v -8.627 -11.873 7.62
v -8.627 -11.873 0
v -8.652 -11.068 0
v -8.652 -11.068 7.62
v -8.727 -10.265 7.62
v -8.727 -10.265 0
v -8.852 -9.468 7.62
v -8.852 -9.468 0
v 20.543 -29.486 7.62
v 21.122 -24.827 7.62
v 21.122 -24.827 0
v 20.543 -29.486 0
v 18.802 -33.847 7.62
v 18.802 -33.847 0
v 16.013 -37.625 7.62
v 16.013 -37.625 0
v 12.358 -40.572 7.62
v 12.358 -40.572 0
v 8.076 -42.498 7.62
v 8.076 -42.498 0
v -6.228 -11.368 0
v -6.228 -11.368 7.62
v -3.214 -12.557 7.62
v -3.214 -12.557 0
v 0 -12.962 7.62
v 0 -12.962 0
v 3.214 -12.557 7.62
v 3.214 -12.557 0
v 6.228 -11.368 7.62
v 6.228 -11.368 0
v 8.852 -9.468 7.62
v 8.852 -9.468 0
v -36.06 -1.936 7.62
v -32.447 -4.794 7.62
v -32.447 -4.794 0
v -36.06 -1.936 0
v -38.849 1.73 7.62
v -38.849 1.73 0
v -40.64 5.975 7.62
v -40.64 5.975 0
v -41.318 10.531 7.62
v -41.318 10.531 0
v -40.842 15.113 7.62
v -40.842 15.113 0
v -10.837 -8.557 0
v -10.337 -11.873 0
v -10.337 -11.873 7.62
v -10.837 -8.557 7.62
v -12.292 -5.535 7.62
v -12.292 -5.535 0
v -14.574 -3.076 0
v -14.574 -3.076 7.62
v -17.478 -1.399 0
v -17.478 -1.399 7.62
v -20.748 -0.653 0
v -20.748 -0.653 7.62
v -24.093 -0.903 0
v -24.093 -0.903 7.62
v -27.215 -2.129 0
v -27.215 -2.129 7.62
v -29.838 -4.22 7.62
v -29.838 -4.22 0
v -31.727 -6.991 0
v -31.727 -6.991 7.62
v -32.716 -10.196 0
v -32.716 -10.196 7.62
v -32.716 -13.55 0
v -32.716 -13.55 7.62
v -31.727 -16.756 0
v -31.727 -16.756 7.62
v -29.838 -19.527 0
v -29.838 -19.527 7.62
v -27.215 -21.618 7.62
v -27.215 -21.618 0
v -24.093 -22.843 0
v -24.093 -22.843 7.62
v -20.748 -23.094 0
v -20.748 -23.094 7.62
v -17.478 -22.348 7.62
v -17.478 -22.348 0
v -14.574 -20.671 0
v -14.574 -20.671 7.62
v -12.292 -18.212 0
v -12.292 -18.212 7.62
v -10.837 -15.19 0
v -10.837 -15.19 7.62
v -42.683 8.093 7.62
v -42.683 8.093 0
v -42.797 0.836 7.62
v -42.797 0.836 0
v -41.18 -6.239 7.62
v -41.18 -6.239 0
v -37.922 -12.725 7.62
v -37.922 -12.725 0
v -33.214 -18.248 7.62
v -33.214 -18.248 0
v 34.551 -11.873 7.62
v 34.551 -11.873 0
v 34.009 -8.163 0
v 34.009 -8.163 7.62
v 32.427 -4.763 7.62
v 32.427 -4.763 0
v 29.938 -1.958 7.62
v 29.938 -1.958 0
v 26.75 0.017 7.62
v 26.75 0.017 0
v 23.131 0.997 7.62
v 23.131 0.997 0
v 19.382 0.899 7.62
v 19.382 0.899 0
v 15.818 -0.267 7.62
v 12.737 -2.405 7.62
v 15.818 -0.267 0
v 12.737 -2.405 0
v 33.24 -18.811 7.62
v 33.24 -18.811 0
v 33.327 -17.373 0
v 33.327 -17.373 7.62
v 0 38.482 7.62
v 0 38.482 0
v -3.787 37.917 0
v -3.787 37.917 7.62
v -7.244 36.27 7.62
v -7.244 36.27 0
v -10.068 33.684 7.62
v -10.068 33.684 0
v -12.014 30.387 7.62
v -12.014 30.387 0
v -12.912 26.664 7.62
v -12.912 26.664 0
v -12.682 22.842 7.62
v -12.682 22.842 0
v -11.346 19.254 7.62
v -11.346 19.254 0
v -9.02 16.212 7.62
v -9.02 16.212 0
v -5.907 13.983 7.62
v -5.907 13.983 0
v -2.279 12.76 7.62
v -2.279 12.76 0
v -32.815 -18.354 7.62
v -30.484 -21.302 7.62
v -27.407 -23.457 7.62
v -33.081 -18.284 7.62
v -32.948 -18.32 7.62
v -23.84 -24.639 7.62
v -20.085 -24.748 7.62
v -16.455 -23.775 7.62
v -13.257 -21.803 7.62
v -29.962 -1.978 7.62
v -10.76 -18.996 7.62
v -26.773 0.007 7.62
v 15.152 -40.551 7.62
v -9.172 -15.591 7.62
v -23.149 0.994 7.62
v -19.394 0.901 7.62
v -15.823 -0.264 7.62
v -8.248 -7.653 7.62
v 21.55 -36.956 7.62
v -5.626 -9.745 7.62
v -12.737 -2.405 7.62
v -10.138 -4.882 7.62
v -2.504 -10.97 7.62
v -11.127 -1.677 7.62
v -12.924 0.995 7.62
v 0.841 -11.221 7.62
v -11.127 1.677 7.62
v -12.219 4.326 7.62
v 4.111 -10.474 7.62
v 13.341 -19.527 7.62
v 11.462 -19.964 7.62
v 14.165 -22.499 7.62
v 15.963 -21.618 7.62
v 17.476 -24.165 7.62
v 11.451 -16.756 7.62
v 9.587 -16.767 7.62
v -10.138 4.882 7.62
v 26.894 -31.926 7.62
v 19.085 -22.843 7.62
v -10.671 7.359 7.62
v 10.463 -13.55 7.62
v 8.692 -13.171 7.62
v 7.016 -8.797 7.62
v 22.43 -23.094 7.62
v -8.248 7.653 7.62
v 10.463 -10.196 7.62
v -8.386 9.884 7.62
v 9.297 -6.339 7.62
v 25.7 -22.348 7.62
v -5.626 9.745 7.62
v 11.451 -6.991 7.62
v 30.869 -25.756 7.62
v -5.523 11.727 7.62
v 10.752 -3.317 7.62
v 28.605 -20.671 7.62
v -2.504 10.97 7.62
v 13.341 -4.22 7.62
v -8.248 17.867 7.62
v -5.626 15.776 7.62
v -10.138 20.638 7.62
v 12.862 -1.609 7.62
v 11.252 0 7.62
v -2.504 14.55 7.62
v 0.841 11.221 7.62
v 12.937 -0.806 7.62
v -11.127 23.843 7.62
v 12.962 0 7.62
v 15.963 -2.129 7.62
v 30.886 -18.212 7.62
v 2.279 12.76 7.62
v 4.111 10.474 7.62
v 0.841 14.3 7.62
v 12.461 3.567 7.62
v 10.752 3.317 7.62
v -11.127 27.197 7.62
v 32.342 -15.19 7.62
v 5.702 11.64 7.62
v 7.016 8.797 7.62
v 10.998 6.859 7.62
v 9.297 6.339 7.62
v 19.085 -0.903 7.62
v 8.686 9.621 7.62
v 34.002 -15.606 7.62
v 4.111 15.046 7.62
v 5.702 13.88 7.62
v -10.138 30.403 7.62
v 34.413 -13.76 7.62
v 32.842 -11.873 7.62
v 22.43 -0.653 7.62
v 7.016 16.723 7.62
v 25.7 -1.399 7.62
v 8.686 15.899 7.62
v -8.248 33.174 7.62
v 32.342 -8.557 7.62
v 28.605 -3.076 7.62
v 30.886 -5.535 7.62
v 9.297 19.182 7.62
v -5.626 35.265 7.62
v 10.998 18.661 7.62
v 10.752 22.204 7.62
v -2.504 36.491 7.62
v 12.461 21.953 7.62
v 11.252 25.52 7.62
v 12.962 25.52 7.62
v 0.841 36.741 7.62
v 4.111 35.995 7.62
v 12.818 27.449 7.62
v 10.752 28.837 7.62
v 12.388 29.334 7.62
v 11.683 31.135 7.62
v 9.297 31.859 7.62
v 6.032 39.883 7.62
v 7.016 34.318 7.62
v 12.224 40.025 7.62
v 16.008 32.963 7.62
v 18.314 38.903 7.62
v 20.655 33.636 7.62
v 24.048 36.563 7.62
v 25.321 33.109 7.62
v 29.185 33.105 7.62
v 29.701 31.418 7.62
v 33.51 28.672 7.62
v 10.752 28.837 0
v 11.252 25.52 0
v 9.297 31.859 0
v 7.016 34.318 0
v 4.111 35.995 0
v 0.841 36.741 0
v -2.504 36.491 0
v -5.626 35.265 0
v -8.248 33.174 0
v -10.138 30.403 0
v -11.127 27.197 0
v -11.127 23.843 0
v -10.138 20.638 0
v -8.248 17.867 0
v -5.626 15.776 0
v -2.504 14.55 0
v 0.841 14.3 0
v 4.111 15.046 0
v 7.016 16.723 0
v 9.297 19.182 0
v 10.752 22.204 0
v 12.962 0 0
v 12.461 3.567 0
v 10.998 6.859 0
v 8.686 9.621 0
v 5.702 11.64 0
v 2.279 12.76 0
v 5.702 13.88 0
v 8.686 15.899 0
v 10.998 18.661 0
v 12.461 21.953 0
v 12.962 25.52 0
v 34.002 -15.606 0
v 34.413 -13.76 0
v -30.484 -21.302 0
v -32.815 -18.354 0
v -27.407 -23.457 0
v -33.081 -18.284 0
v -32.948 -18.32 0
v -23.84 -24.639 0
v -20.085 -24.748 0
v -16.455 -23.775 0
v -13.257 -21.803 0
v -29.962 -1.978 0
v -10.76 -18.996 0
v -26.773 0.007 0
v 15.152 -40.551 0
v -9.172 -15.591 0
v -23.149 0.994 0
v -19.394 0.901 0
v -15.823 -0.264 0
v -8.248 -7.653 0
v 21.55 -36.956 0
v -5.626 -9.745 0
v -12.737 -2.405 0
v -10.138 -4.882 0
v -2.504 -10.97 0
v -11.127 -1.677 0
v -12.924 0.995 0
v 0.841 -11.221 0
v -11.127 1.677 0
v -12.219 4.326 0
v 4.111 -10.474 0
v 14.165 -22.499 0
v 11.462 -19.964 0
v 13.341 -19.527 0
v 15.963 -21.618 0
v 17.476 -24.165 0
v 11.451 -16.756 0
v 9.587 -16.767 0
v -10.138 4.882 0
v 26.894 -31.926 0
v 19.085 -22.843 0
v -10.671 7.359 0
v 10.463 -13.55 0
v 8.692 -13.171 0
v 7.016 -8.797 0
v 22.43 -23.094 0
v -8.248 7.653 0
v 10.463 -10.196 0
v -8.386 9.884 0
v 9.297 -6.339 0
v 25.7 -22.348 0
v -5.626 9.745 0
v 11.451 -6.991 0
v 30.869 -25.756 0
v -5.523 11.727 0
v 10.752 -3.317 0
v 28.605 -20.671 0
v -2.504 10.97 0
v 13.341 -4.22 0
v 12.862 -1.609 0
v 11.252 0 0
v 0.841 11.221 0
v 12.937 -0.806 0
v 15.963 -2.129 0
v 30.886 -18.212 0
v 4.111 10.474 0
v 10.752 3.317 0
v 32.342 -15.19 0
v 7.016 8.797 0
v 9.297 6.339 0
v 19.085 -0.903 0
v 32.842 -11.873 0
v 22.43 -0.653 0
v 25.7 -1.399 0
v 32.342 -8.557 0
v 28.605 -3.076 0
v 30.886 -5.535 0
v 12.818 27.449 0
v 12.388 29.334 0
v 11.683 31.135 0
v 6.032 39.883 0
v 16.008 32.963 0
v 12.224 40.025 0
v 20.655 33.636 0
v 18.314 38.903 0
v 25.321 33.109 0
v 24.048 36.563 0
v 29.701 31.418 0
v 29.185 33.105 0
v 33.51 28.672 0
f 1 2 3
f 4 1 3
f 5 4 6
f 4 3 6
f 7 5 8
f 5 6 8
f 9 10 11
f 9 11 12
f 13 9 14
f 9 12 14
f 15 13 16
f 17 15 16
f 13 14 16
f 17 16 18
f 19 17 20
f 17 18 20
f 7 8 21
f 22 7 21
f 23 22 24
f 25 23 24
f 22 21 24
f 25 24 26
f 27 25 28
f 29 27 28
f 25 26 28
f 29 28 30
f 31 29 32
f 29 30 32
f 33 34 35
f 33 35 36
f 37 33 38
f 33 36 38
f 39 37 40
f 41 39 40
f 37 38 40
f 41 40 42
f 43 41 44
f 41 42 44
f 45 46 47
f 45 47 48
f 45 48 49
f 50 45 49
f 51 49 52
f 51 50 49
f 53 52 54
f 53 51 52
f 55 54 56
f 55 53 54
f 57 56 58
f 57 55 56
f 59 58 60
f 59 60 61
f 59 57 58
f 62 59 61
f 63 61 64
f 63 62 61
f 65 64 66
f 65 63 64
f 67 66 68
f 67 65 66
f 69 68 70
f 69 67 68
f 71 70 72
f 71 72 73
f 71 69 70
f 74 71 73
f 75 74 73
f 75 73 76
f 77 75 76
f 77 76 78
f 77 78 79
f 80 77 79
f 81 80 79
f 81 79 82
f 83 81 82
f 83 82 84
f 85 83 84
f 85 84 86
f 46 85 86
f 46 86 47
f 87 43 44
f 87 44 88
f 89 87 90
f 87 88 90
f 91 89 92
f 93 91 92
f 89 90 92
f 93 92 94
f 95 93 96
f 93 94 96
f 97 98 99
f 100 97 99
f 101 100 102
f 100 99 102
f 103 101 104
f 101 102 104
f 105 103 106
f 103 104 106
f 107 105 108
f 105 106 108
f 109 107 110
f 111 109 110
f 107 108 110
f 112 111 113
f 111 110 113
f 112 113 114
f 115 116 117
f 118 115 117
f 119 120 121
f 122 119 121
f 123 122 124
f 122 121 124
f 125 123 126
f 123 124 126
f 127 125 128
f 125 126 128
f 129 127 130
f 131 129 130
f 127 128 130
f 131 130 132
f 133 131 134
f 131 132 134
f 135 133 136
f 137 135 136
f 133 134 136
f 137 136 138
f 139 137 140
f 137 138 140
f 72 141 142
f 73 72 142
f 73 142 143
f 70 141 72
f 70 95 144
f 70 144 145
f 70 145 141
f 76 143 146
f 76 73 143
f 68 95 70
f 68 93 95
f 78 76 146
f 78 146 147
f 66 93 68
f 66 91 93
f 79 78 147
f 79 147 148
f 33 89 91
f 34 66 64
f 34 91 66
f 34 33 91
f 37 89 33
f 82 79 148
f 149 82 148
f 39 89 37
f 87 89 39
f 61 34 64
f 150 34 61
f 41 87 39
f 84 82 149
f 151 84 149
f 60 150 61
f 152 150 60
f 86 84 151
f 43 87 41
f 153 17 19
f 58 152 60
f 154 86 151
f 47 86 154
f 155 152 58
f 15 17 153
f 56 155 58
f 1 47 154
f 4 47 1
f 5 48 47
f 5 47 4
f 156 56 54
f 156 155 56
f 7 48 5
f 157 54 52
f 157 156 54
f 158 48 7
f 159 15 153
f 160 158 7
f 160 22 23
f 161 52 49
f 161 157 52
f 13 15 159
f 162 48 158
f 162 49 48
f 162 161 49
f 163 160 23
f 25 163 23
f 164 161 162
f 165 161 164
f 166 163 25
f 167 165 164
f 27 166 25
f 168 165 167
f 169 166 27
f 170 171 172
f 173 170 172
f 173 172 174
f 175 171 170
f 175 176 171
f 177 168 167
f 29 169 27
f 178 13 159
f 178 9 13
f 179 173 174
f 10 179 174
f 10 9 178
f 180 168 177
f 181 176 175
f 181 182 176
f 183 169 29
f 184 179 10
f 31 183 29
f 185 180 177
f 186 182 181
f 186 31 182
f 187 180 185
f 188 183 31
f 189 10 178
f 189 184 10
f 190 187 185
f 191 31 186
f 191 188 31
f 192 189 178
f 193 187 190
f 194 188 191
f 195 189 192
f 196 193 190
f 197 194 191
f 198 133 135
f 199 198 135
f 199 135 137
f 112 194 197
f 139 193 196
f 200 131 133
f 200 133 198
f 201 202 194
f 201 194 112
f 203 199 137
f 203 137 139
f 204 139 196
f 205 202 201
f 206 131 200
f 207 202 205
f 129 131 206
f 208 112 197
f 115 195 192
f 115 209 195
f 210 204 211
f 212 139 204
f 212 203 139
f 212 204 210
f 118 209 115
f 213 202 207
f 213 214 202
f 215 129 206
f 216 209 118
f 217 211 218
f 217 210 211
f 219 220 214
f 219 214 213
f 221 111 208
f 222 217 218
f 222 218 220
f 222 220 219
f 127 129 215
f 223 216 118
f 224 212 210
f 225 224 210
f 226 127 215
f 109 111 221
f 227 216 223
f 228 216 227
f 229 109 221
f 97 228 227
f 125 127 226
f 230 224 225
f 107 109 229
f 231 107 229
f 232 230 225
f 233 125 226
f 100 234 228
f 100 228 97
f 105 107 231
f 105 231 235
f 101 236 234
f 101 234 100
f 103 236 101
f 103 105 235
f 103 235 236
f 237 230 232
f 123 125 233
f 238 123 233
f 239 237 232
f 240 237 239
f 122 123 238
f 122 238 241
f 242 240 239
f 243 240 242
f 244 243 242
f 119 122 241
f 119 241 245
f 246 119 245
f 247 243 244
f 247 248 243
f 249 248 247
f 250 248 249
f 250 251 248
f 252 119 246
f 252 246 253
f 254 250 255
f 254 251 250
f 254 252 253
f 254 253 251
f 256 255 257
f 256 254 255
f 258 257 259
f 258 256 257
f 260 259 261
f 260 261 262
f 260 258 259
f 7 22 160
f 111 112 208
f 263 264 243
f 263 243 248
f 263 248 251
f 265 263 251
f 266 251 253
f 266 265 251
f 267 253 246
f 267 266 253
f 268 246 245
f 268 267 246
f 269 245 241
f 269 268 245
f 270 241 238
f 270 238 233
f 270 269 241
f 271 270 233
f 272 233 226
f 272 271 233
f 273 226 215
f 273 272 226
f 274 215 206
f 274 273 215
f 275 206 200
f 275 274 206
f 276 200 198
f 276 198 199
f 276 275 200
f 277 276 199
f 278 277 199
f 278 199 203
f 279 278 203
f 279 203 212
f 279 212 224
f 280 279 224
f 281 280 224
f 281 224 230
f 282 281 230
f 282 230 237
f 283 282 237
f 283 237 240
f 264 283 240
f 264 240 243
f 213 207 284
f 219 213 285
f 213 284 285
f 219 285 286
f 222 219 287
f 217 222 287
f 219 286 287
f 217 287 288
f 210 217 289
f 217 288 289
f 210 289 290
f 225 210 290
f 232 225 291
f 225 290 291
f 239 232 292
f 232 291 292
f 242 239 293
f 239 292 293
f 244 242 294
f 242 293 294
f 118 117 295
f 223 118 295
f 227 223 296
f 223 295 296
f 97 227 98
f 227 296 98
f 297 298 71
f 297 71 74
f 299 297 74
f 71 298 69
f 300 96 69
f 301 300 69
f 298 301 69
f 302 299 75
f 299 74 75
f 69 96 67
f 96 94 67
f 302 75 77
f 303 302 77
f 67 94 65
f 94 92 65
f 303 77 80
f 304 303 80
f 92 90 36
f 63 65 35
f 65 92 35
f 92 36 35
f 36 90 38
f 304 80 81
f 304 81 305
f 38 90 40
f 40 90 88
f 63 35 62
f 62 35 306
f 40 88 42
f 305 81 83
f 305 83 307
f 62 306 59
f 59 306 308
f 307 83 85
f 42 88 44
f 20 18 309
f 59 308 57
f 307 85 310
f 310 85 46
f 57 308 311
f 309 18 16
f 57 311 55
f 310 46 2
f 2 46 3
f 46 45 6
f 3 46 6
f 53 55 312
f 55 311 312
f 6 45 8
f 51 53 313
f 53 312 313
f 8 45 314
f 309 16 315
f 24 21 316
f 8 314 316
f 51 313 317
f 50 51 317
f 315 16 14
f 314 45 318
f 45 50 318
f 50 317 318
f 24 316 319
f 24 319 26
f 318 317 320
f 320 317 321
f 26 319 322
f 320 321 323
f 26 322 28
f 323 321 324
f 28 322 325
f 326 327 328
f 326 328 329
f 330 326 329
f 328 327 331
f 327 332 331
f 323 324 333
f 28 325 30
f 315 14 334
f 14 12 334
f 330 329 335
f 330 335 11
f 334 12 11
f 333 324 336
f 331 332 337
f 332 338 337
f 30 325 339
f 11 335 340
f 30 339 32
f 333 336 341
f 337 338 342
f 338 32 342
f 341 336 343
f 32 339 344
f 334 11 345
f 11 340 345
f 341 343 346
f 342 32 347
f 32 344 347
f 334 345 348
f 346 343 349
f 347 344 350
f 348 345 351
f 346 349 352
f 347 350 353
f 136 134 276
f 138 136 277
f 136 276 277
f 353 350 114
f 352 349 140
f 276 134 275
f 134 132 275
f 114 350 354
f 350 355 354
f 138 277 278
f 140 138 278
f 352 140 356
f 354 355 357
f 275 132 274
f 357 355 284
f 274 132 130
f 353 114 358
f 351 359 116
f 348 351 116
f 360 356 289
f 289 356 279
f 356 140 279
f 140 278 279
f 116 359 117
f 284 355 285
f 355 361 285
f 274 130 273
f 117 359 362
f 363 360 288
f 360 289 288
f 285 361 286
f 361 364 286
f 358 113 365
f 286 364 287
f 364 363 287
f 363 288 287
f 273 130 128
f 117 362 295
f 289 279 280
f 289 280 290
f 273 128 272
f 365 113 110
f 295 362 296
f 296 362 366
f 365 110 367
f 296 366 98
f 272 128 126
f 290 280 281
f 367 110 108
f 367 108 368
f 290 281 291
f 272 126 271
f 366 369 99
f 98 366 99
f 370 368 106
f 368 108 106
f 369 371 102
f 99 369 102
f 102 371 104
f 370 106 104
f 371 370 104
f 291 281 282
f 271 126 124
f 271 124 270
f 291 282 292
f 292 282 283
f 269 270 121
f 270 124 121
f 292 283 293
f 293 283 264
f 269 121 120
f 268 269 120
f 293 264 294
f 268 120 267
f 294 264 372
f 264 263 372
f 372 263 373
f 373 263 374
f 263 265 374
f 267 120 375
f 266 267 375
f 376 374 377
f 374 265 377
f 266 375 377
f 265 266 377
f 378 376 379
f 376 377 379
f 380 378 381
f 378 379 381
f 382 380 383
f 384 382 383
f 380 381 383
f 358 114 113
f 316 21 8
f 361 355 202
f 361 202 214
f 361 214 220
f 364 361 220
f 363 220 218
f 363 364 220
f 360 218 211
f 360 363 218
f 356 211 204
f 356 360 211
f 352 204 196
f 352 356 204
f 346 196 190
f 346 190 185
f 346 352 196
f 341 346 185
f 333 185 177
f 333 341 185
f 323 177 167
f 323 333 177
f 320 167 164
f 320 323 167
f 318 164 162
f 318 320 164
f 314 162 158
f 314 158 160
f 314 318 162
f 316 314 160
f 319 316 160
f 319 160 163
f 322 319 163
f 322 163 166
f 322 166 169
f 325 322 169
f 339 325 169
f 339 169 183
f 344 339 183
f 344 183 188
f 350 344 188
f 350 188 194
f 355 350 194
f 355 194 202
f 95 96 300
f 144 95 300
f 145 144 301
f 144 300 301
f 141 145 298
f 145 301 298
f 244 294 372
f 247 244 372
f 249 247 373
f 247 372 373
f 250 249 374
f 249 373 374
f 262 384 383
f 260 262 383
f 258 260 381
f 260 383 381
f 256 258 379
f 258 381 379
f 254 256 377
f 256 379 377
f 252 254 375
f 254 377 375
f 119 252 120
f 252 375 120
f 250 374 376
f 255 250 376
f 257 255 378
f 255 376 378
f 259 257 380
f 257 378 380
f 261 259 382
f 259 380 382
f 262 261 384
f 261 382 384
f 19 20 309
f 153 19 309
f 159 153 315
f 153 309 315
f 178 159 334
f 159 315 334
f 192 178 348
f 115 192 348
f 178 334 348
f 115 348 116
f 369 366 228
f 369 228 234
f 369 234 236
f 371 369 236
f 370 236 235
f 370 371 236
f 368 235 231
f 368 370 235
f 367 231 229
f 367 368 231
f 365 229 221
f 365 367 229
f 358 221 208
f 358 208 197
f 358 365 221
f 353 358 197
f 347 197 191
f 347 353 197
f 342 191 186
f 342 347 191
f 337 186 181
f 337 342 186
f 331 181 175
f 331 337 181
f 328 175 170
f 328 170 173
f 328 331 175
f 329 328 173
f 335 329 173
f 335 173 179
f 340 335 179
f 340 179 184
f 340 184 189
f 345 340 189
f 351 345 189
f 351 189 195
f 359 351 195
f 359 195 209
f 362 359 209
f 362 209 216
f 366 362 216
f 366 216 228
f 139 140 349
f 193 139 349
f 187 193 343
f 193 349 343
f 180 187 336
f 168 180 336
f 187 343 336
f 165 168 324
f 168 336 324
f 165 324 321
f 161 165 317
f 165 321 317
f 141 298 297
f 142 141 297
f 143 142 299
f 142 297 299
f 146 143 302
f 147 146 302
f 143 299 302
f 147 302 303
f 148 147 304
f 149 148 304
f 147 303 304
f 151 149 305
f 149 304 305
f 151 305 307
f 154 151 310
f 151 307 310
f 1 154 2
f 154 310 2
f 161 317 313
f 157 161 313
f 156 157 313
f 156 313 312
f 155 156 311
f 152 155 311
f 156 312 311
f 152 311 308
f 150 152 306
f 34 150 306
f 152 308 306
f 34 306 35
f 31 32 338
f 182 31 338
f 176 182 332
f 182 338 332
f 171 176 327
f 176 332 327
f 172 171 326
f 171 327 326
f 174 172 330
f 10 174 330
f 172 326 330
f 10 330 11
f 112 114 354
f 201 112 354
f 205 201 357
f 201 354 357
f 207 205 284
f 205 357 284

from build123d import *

# Parameters (mm, degrees)
F0_R     = 11.2522
F1_DEPTH = 7.62
F2_DEPTH = 5.334


with BuildPart() as f1:
    # F0 (on Top) → F1 (new body)
    with BuildSketch(Plane.XY):
        with BuildLine():
            ThreePointArc((12.7369944105, -2.4049880816), (12.9056707985, -1.2077481218), (12.962059801, 0))
            ThreePointArc((12.962059801, 0), (9.9385595014, 8.321059387), (2.2785680744, 12.7602163702))
            ThreePointArc((2.2785680744, 12.7602163702), (0, 12.5583729394), (-2.2785680744, 12.7602163702))
            ThreePointArc((-2.2785680744, 12.7602163702), (-10.6706436404, 7.3588286149), (-12.7369944105, -2.4049880816))
            ThreePointArc((-12.7369944105, -2.4049880816), (-10.231616704, -5.6270418202), (-8.8523481214, -9.4684173452))
            ThreePointArc((-8.8523481214, -9.4684173452), (0, -12.962059801), (8.8523481214, -9.4684173452))
            ThreePointArc((8.8523481214, -9.4684173452), (10.231616704, -5.6270418202), (12.7369944105, -2.4049880816))
        make_face()
        Circle(F0_R, mode=Mode.SUBTRACT)
        with BuildLine():
            ThreePointArc((-2.2785680744, 12.7602163702), (0, 12.5583729394), (2.2785680744, 12.7602163702))
            ThreePointArc((2.2785680744, 12.7602163702), (0, 12.962059801), (-2.2785680744, 12.7602163702))
        make_face()
        with BuildLine():
            ThreePointArc((-2.2785680744, 12.7602163702), (0, 12.962059801), (2.2785680744, 12.7602163702))
            ThreePointArc((2.2785680744, 12.7602163702), (9.9385595014, 17.1993733535), (12.962059801, 25.5204327404))
            ThreePointArc((12.962059801, 25.5204327404), (12.6382642104, 28.3995423305), (11.6830544332, 31.1348101232))
            ThreePointArc((11.6830544332, 31.1348101232), (6.9007644107, 36.492872981), (0, 38.4824925414))
            ThreePointArc((0, 38.4824925414), (-12.9115003379, 26.6641780399), (-2.2785680744, 12.7602163702))
        make_face()
        with Locations((0, 25.5204327404)):
            Circle(F0_R, mode=Mode.SUBTRACT)
        with BuildLine():
            ThreePointArc((34.5514023329, -11.8734054267), (26.7502692198, 0.0169196322), (12.7369944105, -2.4049880816))
            ThreePointArc((12.7369944105, -2.4049880816), (11.3577258278, -6.2463636065), (8.8523481214, -9.4684173452))
            ThreePointArc((8.8523481214, -9.4684173452), (11.4621329747, -19.9638084371), (21.1220092921, -24.8270378875))
            ThreePointArc((21.1220092921, -24.8270378875), (27.8669248008, -23.2139060833), (32.8148156049, -18.3544353272))
            ThreePointArc((32.8148156049, -18.3544353272), (33.0812954491, -17.869238349), (33.3268161418, -17.373106104))
            ThreePointArc((33.3268161418, -17.373106104), (34.2415524007, -14.6905990161), (34.5514023329, -11.8734054267))
        make_face()
        with Locations((21.5893425319, -11.8734054267)):
            Circle(F0_R, mode=Mode.SUBTRACT)
        with BuildLine():
            ThreePointArc((8.8523481214, -9.4684173452), (11.3577258278, -6.2463636065), (12.7369944105, -2.4049880816))
            ThreePointArc((12.7369944105, -2.4049880816), (10.231616704, -5.6270418202), (8.8523481214, -9.4684173452))
        make_face()
        with BuildLine():
            ThreePointArc((-8.8523481214, -9.4684173452), (-10.231616704, -5.6270418202), (-12.7369944105, -2.4049880816))
            ThreePointArc((-12.7369944105, -2.4049880816), (-11.3577258278, -6.2463636065), (-8.8523481214, -9.4684173452))
        make_face()
        with BuildLine():
            ThreePointArc((-8.8523481214, -9.4684173452), (-11.3577258278, -6.2463636065), (-12.7369944105, -2.4049880816))
            ThreePointArc((-12.7369944105, -2.4049880816), (-23.1489478225, 0.9944858388), (-32.4473199354, -4.7939053745))
            ThreePointArc((-32.4473199354, -4.7939053745), (-34.5466450824, -11.5222574559), (-32.8148156049, -18.3544353272))
            ThreePointArc((-32.8148156049, -18.3544353272), (-18.2345145916, -24.3937937504), (-8.6272827309, -11.8734054267))
            ThreePointArc((-8.6272827309, -11.8734054267), (-8.6836717334, -10.665657305), (-8.8523481214, -9.4684173452))
        make_face()
        with Locations((-21.5893425319, -11.8734054267)):
            Circle(F0_R, mode=Mode.SUBTRACT)
        with BuildLine():
            ThreePointArc((33.5095214822, 28.6722648172), (18.313797705, 38.902696715), (0, 38.4824925414))
            ThreePointArc((0, 38.4824925414), (6.9007644107, 36.492872981), (11.6830544332, 31.1348101232))
            ThreePointArc((11.6830544332, 31.1348101232), (23.0045235804, 33.5218836362), (33.5095214822, 28.6722648172))
        make_face()
        with BuildLine():
            ThreePointArc((32.8148156049, -18.3544353272), (27.8669248008, -23.2139060833), (21.1220092921, -24.8270378875))
            ThreePointArc((21.1220092921, -24.8270378875), (17.5285410214, -35.8252545336), (8.0761489747, -42.4980401738))
            ThreePointArc((8.0761489747, -42.4980401738), (24.3755164942, -34.6034732765), (33.2400792742, -18.8106554549))
            ThreePointArc((33.2400792742, -18.8106554549), (33.0293167827, -18.5808028908), (32.8148156049, -18.3544353272))
        make_face()
        with BuildLine():
            Line((33.2400792742, -18.8106554549), (33.3268161418, -17.373106104))
            ThreePointArc((33.3268161418, -17.373106104), (33.0812954491, -17.869238349), (32.8148156049, -18.3544353272))
            ThreePointArc((32.8148156049, -18.3544353272), (33.0293167827, -18.5808028908), (33.2400792742, -18.8106554549))
        make_face()
        with BuildLine():
            ThreePointArc((-32.8148156049, -18.3544353272), (-34.5466450824, -11.5222574559), (-32.4473199354, -4.7939053745))
            ThreePointArc((-32.4473199354, -4.7939053745), (-39.8779765619, 3.7961234456), (-40.8424568889, 15.1130590171))
            ThreePointArc((-40.8424568889, 15.1130590171), (-42.2015912045, -2.7503305518), (-33.2137545387, -18.2476440302))
            ThreePointArc((-33.2137545387, -18.2476440302), (-33.0145748071, -18.3021220393), (-32.8148156049, -18.3544353272))
        make_face()
    extrude(amount=F1_DEPTH)

    # F0 (on Top) → F2 (join)
    with BuildSketch(Plane.XY):
        with BuildLine():
            ThreePointArc((32.8148156049, -18.3544353272), (27.8669248008, -23.2139060833), (21.1220092921, -24.8270378875))
            ThreePointArc((21.1220092921, -24.8270378875), (17.5285410214, -35.8252545336), (8.0761489747, -42.4980401738))
            ThreePointArc((8.0761489747, -42.4980401738), (24.3755164942, -34.6034732765), (33.2400792742, -18.8106554549))
            ThreePointArc((33.2400792742, -18.8106554549), (33.0293167827, -18.5808028908), (32.8148156049, -18.3544353272))
        make_face()
        with BuildLine():
            ThreePointArc((-32.8148156049, -18.3544353272), (-34.5466450824, -11.5222574559), (-32.4473199354, -4.7939053745))
            ThreePointArc((-32.4473199354, -4.7939053745), (-39.8779765619, 3.7961234456), (-40.8424568889, 15.1130590171))
            ThreePointArc((-40.8424568889, 15.1130590171), (-42.2015912045, -2.7503305518), (-33.2137545387, -18.2476440302))
            ThreePointArc((-33.2137545387, -18.2476440302), (-33.0145748071, -18.3021220393), (-32.8148156049, -18.3544353272))
        make_face()
        with BuildLine():
            ThreePointArc((33.5095214822, 28.6722648172), (18.313797705, 38.902696715), (0, 38.4824925414))
            ThreePointArc((0, 38.4824925414), (6.9007644107, 36.492872981), (11.6830544332, 31.1348101232))
            ThreePointArc((11.6830544332, 31.1348101232), (23.0045235804, 33.5218836362), (33.5095214822, 28.6722648172))
        make_face()
        with BuildLine():
            ThreePointArc((-2.2785680744, 12.7602163702), (0, 12.962059801), (2.2785680744, 12.7602163702))
            ThreePointArc((2.2785680744, 12.7602163702), (9.9385595014, 17.1993733535), (12.962059801, 25.5204327404))
            ThreePointArc((12.962059801, 25.5204327404), (12.6382642104, 28.3995423305), (11.6830544332, 31.1348101232))
            ThreePointArc((11.6830544332, 31.1348101232), (6.9007644107, 36.492872981), (0, 38.4824925414))
            ThreePointArc((0, 38.4824925414), (-12.9115003379, 26.6641780399), (-2.2785680744, 12.7602163702))
        make_face()
        with Locations((0, 25.5204327404)):
            Circle(F0_R, mode=Mode.SUBTRACT)
        with BuildLine():
            ThreePointArc((12.7369944105, -2.4049880816), (12.9056707985, -1.2077481218), (12.962059801, 0))
            ThreePointArc((12.962059801, 0), (9.9385595014, 8.321059387), (2.2785680744, 12.7602163702))
            ThreePointArc((2.2785680744, 12.7602163702), (0, 12.5583729394), (-2.2785680744, 12.7602163702))
            ThreePointArc((-2.2785680744, 12.7602163702), (-10.6706436404, 7.3588286149), (-12.7369944105, -2.4049880816))
            ThreePointArc((-12.7369944105, -2.4049880816), (-10.231616704, -5.6270418202), (-8.8523481214, -9.4684173452))
            ThreePointArc((-8.8523481214, -9.4684173452), (0, -12.962059801), (8.8523481214, -9.4684173452))
            ThreePointArc((8.8523481214, -9.4684173452), (10.231616704, -5.6270418202), (12.7369944105, -2.4049880816))
        make_face()
        Circle(F0_R, mode=Mode.SUBTRACT)
        with BuildLine():
            ThreePointArc((34.5514023329, -11.8734054267), (26.7502692198, 0.0169196322), (12.7369944105, -2.4049880816))
            ThreePointArc((12.7369944105, -2.4049880816), (11.3577258278, -6.2463636065), (8.8523481214, -9.4684173452))
            ThreePointArc((8.8523481214, -9.4684173452), (11.4621329747, -19.9638084371), (21.1220092921, -24.8270378875))
            ThreePointArc((21.1220092921, -24.8270378875), (27.8669248008, -23.2139060833), (32.8148156049, -18.3544353272))
            ThreePointArc((32.8148156049, -18.3544353272), (33.0812954491, -17.869238349), (33.3268161418, -17.373106104))
            ThreePointArc((33.3268161418, -17.373106104), (34.2415524007, -14.6905990161), (34.5514023329, -11.8734054267))
        make_face()
        with Locations((21.5893425319, -11.8734054267)):
            Circle(F0_R, mode=Mode.SUBTRACT)
        with BuildLine():
            ThreePointArc((8.8523481214, -9.4684173452), (11.3577258278, -6.2463636065), (12.7369944105, -2.4049880816))
            ThreePointArc((12.7369944105, -2.4049880816), (10.231616704, -5.6270418202), (8.8523481214, -9.4684173452))
        make_face()
        with BuildLine():
            ThreePointArc((-2.2785680744, 12.7602163702), (0, 12.5583729394), (2.2785680744, 12.7602163702))
            ThreePointArc((2.2785680744, 12.7602163702), (0, 12.962059801), (-2.2785680744, 12.7602163702))
        make_face()
        with BuildLine():
            ThreePointArc((-8.8523481214, -9.4684173452), (-10.231616704, -5.6270418202), (-12.7369944105, -2.4049880816))
            ThreePointArc((-12.7369944105, -2.4049880816), (-11.3577258278, -6.2463636065), (-8.8523481214, -9.4684173452))
        make_face()
        with BuildLine():
            ThreePointArc((-8.8523481214, -9.4684173452), (-11.3577258278, -6.2463636065), (-12.7369944105, -2.4049880816))
            ThreePointArc((-12.7369944105, -2.4049880816), (-23.1489478225, 0.9944858388), (-32.4473199354, -4.7939053745))
            ThreePointArc((-32.4473199354, -4.7939053745), (-34.5466450824, -11.5222574559), (-32.8148156049, -18.3544353272))
            ThreePointArc((-32.8148156049, -18.3544353272), (-18.2345145916, -24.3937937504), (-8.6272827309, -11.8734054267))
            ThreePointArc((-8.6272827309, -11.8734054267), (-8.6836717334, -10.665657305), (-8.8523481214, -9.4684173452))
        make_face()
        with Locations((-21.5893425319, -11.8734054267)):
            Circle(F0_R, mode=Mode.SUBTRACT)
    extrude(amount=F2_DEPTH)


solid = f1.part
